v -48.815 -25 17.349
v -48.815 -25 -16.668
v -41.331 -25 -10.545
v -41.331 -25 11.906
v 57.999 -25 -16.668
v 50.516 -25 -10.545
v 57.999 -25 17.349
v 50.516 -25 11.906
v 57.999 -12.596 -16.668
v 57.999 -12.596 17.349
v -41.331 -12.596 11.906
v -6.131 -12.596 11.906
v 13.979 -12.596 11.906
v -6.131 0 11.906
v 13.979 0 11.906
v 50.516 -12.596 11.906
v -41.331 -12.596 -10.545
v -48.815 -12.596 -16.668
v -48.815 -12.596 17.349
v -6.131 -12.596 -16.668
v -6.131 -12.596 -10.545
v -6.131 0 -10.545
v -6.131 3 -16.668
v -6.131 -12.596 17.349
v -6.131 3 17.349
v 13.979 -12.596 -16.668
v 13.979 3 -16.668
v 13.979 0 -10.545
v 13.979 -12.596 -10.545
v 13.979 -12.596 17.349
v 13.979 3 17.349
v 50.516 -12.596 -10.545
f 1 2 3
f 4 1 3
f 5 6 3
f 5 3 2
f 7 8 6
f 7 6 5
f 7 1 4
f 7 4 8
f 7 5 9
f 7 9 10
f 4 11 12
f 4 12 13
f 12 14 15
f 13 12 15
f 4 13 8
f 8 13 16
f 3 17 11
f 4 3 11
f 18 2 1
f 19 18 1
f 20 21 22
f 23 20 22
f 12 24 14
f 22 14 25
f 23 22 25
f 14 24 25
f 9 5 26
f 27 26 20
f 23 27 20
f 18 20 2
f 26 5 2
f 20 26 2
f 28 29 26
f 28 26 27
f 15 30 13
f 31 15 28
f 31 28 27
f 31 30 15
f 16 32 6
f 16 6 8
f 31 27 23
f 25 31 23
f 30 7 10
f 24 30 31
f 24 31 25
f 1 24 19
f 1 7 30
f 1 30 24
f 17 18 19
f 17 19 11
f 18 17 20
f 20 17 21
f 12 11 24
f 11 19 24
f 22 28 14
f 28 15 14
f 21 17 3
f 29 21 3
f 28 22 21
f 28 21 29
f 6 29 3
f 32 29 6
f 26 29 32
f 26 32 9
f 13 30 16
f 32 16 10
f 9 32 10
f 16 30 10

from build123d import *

# Parameters (mm, degrees)
F0_W     = 106.8142578006
F0_H     = 34.0172816068
F0_W_2   = 91.846652329
F0_H_2   = 22.4514044821
F1_DEPTH = 25
F2_W     = 106.8142578006
F2_H     = 34.0172816068
F3_DEPTH = 3
F4_W     = 42.6840842701
F4_H     = 15.5962775201
F4_W_2   = 44.0205549821
F5_DEPTH = 42.7


with BuildPart() as f1:
    # F0 (on Front) → F1 (new body)
    with BuildSketch(Plane.XZ):
        with Locations((4.592332989, 0.3401720896)):
            Rectangle(F0_W, F0_H)
        with Locations((4.592332989, 0.6803460419)):
            Rectangle(F0_W_2, F0_H_2, mode=Mode.SUBTRACT)
    extrude(amount=F1_DEPTH)

    # F2 (on face) → F3 (join)
    with BuildSketch(Plane(origin=(0, 0, 0), x_dir=(-1, 0, 0), z_dir=(0, 1, 0))):
        with Locations((-4.592332989, 0.3401720896)):
            Rectangle(F2_W, F2_H)
    extrude(amount=F3_DEPTH)

    # F4 (on face) → F5 (cut)
    with BuildSketch(Plane.XY.offset(17.348812893)):
        with Locations((-27.4727537762, -4.79813876)):
            Rectangle(F4_W, F4_H)
        with Locations((35.9891843982, -4.79813876)):
            Rectangle(F4_W_2, F4_H)
    extrude(amount=-F5_DEPTH, mode=Mode.SUBTRACT)


solid = f1.part
